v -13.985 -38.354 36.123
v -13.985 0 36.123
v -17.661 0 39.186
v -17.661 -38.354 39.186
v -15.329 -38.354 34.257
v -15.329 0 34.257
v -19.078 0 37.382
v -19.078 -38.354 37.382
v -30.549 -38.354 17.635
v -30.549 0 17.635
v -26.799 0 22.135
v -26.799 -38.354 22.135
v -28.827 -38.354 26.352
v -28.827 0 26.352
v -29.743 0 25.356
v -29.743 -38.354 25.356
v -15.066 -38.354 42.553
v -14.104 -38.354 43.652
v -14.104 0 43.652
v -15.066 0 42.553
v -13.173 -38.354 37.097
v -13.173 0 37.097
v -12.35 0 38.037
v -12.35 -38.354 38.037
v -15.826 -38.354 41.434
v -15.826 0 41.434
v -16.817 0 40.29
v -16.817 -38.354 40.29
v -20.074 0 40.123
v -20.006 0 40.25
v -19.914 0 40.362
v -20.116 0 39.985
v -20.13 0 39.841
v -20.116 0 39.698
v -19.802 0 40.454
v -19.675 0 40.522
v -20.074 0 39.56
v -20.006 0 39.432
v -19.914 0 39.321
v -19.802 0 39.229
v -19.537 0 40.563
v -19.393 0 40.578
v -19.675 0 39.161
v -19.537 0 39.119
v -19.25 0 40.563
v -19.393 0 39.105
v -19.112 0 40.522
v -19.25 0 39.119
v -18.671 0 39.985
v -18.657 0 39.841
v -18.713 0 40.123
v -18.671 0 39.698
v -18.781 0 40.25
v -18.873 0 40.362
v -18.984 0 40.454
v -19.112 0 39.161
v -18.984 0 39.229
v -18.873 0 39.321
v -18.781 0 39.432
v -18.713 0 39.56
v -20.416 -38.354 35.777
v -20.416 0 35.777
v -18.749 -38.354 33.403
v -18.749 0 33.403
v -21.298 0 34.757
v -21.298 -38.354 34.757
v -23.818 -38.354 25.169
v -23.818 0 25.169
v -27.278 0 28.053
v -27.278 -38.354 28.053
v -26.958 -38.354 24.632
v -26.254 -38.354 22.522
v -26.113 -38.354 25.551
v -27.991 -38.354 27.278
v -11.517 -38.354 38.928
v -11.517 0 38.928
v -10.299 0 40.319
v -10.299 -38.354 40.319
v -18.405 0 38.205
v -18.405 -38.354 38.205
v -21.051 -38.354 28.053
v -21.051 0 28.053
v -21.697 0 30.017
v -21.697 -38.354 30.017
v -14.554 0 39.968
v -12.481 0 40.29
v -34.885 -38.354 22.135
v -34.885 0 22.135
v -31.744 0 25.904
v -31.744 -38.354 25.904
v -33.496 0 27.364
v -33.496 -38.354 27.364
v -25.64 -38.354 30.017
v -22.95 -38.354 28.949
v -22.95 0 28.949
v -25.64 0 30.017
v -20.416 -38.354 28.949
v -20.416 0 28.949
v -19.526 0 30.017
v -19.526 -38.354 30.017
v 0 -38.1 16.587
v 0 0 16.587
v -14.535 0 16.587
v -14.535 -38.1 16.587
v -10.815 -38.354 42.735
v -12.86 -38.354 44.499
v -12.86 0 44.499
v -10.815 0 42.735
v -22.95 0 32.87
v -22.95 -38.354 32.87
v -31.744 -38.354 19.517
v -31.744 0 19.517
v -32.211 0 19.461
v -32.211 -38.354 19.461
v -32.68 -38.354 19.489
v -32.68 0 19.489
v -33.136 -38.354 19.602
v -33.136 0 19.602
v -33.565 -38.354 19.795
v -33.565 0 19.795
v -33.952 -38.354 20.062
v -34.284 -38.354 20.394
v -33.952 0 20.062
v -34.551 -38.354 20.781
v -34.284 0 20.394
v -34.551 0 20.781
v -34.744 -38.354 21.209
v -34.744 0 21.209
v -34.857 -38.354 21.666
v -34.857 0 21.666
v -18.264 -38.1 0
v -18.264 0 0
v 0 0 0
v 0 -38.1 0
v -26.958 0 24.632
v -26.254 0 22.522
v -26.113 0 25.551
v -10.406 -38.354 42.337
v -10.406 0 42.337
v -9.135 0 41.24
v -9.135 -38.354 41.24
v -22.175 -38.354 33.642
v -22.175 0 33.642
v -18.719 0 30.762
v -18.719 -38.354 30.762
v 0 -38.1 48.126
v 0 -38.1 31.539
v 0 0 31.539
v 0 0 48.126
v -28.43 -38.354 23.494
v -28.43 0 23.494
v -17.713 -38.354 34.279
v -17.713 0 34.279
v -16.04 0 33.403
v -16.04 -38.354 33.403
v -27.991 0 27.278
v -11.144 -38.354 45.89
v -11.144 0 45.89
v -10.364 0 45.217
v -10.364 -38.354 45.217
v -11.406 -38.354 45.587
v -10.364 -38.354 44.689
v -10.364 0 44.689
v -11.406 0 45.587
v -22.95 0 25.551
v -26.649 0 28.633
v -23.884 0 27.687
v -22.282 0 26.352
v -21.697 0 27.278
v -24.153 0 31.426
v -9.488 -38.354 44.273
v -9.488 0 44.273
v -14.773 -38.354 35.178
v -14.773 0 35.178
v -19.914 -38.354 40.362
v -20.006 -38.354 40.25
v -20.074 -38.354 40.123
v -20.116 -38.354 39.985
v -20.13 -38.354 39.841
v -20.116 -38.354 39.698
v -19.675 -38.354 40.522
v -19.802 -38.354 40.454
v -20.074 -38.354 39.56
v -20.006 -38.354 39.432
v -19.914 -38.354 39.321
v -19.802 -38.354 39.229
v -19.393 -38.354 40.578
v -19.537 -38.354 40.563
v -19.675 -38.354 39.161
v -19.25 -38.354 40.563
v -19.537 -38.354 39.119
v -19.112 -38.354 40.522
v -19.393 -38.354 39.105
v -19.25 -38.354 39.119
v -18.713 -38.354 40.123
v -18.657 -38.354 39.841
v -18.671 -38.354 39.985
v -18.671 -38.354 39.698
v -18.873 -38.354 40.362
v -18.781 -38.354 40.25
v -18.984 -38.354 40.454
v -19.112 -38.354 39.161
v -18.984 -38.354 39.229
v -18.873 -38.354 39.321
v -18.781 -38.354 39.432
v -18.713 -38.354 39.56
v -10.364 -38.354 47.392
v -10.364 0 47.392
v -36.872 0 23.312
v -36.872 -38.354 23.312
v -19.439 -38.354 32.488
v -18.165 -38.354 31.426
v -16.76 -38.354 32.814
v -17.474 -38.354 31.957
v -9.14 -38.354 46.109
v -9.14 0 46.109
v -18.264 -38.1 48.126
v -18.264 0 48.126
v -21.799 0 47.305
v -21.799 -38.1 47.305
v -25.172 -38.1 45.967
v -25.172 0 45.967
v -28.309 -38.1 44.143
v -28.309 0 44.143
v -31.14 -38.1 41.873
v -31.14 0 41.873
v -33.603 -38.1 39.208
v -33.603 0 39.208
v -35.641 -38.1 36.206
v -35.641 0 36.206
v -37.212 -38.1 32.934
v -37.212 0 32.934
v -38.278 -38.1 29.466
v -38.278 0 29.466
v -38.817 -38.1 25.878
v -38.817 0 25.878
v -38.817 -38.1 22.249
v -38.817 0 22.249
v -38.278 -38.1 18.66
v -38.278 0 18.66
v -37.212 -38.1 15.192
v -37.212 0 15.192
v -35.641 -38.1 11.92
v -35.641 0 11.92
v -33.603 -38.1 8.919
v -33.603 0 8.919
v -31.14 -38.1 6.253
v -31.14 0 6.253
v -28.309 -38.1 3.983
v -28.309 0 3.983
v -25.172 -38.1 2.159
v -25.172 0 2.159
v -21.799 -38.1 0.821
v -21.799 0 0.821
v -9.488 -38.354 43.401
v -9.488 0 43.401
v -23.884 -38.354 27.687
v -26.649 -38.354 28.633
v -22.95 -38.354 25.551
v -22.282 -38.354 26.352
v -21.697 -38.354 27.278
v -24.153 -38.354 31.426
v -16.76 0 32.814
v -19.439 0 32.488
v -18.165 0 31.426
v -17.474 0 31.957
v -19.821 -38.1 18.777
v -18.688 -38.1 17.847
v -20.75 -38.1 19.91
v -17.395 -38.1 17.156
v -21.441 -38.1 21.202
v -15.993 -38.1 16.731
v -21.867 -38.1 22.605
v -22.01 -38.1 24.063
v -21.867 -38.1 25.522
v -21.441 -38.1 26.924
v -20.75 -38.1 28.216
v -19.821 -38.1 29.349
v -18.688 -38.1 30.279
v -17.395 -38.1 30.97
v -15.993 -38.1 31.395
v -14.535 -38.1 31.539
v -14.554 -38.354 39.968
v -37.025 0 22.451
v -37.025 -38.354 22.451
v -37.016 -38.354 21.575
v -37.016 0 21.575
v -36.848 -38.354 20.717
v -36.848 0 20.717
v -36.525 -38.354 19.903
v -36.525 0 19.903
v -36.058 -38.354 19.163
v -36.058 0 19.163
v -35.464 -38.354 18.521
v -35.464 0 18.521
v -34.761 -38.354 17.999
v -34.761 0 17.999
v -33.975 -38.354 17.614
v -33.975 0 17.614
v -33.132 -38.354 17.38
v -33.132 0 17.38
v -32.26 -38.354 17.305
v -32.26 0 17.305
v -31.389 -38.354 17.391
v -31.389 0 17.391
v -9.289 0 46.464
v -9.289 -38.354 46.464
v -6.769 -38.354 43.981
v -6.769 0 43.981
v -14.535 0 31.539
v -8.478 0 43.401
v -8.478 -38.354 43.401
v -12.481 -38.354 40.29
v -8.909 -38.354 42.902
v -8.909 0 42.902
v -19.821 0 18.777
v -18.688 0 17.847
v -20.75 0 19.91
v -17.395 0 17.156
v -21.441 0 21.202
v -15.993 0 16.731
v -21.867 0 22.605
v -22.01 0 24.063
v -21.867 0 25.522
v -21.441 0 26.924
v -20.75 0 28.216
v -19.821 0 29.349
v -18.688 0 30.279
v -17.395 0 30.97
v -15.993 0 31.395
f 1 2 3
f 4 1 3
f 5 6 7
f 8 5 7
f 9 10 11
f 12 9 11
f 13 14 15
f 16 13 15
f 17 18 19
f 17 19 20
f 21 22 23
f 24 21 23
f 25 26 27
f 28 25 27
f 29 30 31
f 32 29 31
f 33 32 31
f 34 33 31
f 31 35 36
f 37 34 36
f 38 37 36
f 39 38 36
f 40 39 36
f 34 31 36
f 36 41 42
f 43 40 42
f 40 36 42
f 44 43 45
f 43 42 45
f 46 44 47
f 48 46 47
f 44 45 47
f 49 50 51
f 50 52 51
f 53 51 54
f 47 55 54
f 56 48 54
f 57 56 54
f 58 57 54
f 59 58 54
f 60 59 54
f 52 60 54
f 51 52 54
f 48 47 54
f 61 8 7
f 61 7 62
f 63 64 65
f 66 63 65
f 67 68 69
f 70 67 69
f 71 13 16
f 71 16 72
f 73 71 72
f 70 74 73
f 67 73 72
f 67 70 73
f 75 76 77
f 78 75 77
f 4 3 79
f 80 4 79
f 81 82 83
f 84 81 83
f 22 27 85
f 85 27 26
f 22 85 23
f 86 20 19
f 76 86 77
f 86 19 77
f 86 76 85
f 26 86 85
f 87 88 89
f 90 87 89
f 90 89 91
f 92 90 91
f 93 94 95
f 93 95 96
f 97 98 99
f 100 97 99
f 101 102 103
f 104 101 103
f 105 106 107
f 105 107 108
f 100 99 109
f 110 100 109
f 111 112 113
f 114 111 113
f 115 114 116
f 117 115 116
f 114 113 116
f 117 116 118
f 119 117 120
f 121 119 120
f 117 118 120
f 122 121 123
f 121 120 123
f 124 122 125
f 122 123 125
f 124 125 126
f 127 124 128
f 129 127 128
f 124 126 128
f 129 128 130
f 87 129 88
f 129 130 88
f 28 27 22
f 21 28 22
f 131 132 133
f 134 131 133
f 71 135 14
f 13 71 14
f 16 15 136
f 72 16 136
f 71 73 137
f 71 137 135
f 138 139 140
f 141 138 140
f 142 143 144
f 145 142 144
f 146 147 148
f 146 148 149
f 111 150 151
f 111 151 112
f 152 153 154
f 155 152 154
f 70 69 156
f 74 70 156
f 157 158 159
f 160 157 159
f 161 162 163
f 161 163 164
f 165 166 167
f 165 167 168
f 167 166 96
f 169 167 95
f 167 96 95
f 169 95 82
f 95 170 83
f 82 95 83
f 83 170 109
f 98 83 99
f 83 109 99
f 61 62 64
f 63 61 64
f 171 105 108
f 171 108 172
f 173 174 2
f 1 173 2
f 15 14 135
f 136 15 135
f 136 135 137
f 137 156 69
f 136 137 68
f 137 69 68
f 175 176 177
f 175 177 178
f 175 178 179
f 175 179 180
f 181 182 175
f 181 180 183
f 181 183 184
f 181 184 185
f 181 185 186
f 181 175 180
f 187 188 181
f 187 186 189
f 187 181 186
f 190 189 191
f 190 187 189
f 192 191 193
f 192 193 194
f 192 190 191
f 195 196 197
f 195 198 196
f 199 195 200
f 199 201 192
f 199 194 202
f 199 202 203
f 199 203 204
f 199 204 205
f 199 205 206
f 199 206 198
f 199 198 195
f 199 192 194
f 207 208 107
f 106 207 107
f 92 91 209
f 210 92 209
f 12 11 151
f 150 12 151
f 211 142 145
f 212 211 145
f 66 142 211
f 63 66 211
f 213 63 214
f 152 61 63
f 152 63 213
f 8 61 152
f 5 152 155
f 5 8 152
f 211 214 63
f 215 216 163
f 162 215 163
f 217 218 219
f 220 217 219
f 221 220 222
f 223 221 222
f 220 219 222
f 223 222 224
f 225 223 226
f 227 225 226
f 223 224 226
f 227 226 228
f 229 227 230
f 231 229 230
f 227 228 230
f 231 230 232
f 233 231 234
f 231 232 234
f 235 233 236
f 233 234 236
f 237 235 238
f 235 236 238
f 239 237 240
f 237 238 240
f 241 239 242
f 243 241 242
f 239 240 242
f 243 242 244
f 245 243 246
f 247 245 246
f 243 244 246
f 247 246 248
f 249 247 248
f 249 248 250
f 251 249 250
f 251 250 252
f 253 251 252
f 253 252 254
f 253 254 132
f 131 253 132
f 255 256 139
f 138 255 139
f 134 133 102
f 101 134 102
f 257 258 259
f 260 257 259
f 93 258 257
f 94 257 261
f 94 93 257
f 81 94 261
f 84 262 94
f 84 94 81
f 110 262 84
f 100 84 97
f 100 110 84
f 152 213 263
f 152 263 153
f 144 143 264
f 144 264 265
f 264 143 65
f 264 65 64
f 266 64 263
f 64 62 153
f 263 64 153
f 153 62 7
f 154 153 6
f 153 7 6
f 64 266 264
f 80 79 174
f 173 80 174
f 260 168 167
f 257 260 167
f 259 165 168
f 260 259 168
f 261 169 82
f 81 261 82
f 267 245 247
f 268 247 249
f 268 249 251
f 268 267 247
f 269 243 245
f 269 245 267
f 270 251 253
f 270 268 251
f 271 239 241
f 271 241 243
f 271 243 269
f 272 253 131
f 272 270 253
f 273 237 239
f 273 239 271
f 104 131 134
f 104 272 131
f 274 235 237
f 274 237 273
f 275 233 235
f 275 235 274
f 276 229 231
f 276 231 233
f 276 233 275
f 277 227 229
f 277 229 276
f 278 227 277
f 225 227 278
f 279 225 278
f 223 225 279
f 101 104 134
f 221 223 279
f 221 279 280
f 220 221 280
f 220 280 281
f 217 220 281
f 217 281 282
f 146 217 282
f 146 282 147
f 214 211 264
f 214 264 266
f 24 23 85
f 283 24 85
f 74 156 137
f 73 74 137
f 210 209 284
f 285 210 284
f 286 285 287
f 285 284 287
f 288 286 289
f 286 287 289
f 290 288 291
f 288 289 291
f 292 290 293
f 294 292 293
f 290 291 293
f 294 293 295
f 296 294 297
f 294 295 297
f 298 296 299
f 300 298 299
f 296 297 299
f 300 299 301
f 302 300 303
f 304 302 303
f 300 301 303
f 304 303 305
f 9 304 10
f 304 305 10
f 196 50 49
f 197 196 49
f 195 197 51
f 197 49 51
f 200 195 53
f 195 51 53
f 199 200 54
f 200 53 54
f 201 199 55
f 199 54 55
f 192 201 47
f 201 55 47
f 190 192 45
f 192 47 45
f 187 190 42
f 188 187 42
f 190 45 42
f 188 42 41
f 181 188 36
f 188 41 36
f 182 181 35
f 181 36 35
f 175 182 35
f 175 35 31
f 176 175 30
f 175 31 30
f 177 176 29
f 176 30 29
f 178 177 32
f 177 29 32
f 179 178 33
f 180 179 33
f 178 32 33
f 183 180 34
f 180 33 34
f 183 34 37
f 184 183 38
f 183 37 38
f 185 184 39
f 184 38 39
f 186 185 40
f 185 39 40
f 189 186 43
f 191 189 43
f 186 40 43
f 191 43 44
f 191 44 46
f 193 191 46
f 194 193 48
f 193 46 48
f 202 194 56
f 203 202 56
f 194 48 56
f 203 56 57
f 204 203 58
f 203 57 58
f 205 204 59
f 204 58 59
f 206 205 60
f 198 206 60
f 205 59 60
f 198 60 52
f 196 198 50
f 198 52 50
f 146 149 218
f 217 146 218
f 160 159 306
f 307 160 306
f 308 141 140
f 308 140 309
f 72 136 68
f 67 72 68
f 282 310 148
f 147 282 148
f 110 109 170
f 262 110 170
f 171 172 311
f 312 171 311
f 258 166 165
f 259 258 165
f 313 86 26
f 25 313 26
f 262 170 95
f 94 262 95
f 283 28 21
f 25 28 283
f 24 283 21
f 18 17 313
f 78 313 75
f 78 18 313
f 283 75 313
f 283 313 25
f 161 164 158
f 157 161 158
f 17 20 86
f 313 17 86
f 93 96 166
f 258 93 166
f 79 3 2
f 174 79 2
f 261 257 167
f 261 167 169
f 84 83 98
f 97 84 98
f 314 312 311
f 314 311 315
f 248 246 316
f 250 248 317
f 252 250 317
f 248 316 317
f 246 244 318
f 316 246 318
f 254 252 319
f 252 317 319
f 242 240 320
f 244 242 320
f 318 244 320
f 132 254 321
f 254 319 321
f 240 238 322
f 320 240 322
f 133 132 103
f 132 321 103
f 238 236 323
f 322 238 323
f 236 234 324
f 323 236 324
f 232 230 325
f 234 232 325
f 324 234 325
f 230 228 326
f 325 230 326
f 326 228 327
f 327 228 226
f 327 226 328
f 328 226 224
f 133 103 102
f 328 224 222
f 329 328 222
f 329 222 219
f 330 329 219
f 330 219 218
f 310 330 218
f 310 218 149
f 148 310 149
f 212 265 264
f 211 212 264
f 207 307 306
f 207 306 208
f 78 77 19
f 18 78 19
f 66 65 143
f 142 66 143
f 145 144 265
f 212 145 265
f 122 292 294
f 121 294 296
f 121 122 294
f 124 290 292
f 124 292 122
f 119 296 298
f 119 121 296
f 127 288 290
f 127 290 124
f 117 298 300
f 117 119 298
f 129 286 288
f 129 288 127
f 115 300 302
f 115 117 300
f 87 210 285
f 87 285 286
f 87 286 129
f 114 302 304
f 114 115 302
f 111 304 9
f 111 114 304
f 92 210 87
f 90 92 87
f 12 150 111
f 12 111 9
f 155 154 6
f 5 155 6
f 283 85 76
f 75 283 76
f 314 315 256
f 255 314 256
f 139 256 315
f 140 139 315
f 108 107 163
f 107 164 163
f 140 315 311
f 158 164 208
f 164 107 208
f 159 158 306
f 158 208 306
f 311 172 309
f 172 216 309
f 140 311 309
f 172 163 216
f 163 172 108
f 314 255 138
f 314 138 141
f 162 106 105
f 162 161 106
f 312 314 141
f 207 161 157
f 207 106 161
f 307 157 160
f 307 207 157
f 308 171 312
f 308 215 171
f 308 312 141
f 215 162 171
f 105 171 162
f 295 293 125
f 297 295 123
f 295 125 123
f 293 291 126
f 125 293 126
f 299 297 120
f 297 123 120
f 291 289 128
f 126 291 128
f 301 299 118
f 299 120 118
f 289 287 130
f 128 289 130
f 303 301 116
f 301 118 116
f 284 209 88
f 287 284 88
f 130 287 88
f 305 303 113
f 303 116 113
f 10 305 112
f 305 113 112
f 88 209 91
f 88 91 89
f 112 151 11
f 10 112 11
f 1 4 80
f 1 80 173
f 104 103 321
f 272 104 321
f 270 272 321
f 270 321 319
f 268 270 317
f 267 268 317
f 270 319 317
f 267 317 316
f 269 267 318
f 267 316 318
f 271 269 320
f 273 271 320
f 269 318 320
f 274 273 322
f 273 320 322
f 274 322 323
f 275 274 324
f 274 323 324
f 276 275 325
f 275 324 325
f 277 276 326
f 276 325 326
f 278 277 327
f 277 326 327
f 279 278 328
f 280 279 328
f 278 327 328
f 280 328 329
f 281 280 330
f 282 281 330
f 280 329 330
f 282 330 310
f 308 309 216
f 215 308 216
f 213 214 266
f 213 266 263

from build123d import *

# Parameters (mm, degrees)
F1_R     = 0.736194
F2_DEPTH = 38.354
F3_DEPTH = 38.1


with BuildPart() as f2:
    # F1 (on Front) → F2 (new body)
    with BuildSketch(Plane.XZ):
        with BuildLine():
            Line((-33.495814, 27.36377), (-36.872063, 23.312273))
            ThreePointArc((-36.872063, 23.312273), (-35.463617, 18.521035), (-30.548924, 17.634769))
            Line((-30.548924, 17.634769), (-26.798948, 22.134738))
            Line((-26.798948, 22.134738), (-28.430059, 23.493998))
            Line((-28.430059, 23.493998), (-31.744041, 19.517221))
            ThreePointArc((-31.744041, 19.517221), (-33.951605, 20.061516), (-34.88506, 22.134738))
            Line((-34.88506, 22.134738), (-31.744041, 25.903959))
            Line((-31.744041, 25.903959), (-33.495814, 27.36377))
        make_face()
        Polygon((-28.827148, 26.352072), (-29.74334, 25.356213), (-26.25356, 22.521653), (-23.817614, 25.169415), (-27.278091, 28.053147), (-27.991037, 27.278208), (-26.113228, 25.550621), (-26.95797, 24.632426), align=None)
        Polygon((-25.640393, 30.01684), (-26.648639, 28.632956), (-22.949839, 25.550621), (-22.281963, 26.352072), (-23.883928, 27.687043), (-21.696785, 27.278208), (-21.051002, 28.053147), (-21.696785, 30.01684), (-20.415554, 28.949146), (-19.525808, 30.01684), (-22.949839, 32.8702), (-24.153036, 31.426364), (-22.949839, 28.949146), align=None)
        Polygon((-21.298442, 34.757137), (-22.1748, 33.64177), (-18.719002, 30.761938), (-18.165313, 31.426364), (-19.438708, 32.487527), (-17.474338, 31.956945), (-16.760014, 32.814134), (-17.713346, 34.279123), (-16.040299, 33.402763), (-15.328503, 34.256919), (-19.078162, 37.381636), (-20.415554, 35.776767), (-18.74904, 33.402763), align=None)
        Polygon((-17.660531, 39.186184), (-18.404817, 38.204513), (-14.772538, 35.177613), (-13.984713, 36.123002), align=None)
        with Locations((-19.393457, 39.841384)):
            Circle(F1_R)
        Polygon((-15.826364, 41.433961), (-16.817451, 40.289652), (-13.172523, 37.097198), (-12.349696, 38.036647), (-14.554318, 39.967592), (-11.516945, 38.928492), (-10.299021, 40.319036), (-14.103899, 43.651585), (-15.065886, 42.553254), (-12.481457, 40.289652), align=None)
        Polygon((-9.487918, 43.401434), (-10.406311, 42.336869), (-9.134507, 41.239691), (-6.769358, 43.981276), (-9.139585, 46.108788), (-10.364274, 44.689178), (-11.40556, 45.587489), (-11.144366, 45.890255), (-10.364274, 45.217274), (-9.288745, 46.463985), (-10.364274, 47.391838), (-12.86014, 44.498731), (-10.815193, 42.734569), (-9.487918, 44.273093), (-8.477525, 43.401434), (-8.908644, 42.901698), align=None)
    extrude(amount=F2_DEPTH)


with BuildPart() as f3:
    # F0 (on Front) → F3 (new body)
    with BuildSketch(Plane.XZ):
        with BuildLine():
            Line((0, 31.538878), (0, 48.126314))
            Line((0, 48.126314), (-18.264385, 48.126314))
            ThreePointArc((-18.264385, 48.126314), (-38.885019, 24.063157), (-18.264385, 0))
            Line((-18.264385, 0), (0, 0))
            Line((0, 0), (0, 16.587436))
            Line((0, 16.587436), (-14.534506, 16.587436))
            ThreePointArc((-14.534506, 16.587436), (-22.010226, 24.063157), (-14.534506, 31.538878))
            Line((-14.534506, 31.538878), (0, 31.538878))
        make_face()
    extrude(amount=F3_DEPTH)


solid = Compound([f2.part, f3.part])
